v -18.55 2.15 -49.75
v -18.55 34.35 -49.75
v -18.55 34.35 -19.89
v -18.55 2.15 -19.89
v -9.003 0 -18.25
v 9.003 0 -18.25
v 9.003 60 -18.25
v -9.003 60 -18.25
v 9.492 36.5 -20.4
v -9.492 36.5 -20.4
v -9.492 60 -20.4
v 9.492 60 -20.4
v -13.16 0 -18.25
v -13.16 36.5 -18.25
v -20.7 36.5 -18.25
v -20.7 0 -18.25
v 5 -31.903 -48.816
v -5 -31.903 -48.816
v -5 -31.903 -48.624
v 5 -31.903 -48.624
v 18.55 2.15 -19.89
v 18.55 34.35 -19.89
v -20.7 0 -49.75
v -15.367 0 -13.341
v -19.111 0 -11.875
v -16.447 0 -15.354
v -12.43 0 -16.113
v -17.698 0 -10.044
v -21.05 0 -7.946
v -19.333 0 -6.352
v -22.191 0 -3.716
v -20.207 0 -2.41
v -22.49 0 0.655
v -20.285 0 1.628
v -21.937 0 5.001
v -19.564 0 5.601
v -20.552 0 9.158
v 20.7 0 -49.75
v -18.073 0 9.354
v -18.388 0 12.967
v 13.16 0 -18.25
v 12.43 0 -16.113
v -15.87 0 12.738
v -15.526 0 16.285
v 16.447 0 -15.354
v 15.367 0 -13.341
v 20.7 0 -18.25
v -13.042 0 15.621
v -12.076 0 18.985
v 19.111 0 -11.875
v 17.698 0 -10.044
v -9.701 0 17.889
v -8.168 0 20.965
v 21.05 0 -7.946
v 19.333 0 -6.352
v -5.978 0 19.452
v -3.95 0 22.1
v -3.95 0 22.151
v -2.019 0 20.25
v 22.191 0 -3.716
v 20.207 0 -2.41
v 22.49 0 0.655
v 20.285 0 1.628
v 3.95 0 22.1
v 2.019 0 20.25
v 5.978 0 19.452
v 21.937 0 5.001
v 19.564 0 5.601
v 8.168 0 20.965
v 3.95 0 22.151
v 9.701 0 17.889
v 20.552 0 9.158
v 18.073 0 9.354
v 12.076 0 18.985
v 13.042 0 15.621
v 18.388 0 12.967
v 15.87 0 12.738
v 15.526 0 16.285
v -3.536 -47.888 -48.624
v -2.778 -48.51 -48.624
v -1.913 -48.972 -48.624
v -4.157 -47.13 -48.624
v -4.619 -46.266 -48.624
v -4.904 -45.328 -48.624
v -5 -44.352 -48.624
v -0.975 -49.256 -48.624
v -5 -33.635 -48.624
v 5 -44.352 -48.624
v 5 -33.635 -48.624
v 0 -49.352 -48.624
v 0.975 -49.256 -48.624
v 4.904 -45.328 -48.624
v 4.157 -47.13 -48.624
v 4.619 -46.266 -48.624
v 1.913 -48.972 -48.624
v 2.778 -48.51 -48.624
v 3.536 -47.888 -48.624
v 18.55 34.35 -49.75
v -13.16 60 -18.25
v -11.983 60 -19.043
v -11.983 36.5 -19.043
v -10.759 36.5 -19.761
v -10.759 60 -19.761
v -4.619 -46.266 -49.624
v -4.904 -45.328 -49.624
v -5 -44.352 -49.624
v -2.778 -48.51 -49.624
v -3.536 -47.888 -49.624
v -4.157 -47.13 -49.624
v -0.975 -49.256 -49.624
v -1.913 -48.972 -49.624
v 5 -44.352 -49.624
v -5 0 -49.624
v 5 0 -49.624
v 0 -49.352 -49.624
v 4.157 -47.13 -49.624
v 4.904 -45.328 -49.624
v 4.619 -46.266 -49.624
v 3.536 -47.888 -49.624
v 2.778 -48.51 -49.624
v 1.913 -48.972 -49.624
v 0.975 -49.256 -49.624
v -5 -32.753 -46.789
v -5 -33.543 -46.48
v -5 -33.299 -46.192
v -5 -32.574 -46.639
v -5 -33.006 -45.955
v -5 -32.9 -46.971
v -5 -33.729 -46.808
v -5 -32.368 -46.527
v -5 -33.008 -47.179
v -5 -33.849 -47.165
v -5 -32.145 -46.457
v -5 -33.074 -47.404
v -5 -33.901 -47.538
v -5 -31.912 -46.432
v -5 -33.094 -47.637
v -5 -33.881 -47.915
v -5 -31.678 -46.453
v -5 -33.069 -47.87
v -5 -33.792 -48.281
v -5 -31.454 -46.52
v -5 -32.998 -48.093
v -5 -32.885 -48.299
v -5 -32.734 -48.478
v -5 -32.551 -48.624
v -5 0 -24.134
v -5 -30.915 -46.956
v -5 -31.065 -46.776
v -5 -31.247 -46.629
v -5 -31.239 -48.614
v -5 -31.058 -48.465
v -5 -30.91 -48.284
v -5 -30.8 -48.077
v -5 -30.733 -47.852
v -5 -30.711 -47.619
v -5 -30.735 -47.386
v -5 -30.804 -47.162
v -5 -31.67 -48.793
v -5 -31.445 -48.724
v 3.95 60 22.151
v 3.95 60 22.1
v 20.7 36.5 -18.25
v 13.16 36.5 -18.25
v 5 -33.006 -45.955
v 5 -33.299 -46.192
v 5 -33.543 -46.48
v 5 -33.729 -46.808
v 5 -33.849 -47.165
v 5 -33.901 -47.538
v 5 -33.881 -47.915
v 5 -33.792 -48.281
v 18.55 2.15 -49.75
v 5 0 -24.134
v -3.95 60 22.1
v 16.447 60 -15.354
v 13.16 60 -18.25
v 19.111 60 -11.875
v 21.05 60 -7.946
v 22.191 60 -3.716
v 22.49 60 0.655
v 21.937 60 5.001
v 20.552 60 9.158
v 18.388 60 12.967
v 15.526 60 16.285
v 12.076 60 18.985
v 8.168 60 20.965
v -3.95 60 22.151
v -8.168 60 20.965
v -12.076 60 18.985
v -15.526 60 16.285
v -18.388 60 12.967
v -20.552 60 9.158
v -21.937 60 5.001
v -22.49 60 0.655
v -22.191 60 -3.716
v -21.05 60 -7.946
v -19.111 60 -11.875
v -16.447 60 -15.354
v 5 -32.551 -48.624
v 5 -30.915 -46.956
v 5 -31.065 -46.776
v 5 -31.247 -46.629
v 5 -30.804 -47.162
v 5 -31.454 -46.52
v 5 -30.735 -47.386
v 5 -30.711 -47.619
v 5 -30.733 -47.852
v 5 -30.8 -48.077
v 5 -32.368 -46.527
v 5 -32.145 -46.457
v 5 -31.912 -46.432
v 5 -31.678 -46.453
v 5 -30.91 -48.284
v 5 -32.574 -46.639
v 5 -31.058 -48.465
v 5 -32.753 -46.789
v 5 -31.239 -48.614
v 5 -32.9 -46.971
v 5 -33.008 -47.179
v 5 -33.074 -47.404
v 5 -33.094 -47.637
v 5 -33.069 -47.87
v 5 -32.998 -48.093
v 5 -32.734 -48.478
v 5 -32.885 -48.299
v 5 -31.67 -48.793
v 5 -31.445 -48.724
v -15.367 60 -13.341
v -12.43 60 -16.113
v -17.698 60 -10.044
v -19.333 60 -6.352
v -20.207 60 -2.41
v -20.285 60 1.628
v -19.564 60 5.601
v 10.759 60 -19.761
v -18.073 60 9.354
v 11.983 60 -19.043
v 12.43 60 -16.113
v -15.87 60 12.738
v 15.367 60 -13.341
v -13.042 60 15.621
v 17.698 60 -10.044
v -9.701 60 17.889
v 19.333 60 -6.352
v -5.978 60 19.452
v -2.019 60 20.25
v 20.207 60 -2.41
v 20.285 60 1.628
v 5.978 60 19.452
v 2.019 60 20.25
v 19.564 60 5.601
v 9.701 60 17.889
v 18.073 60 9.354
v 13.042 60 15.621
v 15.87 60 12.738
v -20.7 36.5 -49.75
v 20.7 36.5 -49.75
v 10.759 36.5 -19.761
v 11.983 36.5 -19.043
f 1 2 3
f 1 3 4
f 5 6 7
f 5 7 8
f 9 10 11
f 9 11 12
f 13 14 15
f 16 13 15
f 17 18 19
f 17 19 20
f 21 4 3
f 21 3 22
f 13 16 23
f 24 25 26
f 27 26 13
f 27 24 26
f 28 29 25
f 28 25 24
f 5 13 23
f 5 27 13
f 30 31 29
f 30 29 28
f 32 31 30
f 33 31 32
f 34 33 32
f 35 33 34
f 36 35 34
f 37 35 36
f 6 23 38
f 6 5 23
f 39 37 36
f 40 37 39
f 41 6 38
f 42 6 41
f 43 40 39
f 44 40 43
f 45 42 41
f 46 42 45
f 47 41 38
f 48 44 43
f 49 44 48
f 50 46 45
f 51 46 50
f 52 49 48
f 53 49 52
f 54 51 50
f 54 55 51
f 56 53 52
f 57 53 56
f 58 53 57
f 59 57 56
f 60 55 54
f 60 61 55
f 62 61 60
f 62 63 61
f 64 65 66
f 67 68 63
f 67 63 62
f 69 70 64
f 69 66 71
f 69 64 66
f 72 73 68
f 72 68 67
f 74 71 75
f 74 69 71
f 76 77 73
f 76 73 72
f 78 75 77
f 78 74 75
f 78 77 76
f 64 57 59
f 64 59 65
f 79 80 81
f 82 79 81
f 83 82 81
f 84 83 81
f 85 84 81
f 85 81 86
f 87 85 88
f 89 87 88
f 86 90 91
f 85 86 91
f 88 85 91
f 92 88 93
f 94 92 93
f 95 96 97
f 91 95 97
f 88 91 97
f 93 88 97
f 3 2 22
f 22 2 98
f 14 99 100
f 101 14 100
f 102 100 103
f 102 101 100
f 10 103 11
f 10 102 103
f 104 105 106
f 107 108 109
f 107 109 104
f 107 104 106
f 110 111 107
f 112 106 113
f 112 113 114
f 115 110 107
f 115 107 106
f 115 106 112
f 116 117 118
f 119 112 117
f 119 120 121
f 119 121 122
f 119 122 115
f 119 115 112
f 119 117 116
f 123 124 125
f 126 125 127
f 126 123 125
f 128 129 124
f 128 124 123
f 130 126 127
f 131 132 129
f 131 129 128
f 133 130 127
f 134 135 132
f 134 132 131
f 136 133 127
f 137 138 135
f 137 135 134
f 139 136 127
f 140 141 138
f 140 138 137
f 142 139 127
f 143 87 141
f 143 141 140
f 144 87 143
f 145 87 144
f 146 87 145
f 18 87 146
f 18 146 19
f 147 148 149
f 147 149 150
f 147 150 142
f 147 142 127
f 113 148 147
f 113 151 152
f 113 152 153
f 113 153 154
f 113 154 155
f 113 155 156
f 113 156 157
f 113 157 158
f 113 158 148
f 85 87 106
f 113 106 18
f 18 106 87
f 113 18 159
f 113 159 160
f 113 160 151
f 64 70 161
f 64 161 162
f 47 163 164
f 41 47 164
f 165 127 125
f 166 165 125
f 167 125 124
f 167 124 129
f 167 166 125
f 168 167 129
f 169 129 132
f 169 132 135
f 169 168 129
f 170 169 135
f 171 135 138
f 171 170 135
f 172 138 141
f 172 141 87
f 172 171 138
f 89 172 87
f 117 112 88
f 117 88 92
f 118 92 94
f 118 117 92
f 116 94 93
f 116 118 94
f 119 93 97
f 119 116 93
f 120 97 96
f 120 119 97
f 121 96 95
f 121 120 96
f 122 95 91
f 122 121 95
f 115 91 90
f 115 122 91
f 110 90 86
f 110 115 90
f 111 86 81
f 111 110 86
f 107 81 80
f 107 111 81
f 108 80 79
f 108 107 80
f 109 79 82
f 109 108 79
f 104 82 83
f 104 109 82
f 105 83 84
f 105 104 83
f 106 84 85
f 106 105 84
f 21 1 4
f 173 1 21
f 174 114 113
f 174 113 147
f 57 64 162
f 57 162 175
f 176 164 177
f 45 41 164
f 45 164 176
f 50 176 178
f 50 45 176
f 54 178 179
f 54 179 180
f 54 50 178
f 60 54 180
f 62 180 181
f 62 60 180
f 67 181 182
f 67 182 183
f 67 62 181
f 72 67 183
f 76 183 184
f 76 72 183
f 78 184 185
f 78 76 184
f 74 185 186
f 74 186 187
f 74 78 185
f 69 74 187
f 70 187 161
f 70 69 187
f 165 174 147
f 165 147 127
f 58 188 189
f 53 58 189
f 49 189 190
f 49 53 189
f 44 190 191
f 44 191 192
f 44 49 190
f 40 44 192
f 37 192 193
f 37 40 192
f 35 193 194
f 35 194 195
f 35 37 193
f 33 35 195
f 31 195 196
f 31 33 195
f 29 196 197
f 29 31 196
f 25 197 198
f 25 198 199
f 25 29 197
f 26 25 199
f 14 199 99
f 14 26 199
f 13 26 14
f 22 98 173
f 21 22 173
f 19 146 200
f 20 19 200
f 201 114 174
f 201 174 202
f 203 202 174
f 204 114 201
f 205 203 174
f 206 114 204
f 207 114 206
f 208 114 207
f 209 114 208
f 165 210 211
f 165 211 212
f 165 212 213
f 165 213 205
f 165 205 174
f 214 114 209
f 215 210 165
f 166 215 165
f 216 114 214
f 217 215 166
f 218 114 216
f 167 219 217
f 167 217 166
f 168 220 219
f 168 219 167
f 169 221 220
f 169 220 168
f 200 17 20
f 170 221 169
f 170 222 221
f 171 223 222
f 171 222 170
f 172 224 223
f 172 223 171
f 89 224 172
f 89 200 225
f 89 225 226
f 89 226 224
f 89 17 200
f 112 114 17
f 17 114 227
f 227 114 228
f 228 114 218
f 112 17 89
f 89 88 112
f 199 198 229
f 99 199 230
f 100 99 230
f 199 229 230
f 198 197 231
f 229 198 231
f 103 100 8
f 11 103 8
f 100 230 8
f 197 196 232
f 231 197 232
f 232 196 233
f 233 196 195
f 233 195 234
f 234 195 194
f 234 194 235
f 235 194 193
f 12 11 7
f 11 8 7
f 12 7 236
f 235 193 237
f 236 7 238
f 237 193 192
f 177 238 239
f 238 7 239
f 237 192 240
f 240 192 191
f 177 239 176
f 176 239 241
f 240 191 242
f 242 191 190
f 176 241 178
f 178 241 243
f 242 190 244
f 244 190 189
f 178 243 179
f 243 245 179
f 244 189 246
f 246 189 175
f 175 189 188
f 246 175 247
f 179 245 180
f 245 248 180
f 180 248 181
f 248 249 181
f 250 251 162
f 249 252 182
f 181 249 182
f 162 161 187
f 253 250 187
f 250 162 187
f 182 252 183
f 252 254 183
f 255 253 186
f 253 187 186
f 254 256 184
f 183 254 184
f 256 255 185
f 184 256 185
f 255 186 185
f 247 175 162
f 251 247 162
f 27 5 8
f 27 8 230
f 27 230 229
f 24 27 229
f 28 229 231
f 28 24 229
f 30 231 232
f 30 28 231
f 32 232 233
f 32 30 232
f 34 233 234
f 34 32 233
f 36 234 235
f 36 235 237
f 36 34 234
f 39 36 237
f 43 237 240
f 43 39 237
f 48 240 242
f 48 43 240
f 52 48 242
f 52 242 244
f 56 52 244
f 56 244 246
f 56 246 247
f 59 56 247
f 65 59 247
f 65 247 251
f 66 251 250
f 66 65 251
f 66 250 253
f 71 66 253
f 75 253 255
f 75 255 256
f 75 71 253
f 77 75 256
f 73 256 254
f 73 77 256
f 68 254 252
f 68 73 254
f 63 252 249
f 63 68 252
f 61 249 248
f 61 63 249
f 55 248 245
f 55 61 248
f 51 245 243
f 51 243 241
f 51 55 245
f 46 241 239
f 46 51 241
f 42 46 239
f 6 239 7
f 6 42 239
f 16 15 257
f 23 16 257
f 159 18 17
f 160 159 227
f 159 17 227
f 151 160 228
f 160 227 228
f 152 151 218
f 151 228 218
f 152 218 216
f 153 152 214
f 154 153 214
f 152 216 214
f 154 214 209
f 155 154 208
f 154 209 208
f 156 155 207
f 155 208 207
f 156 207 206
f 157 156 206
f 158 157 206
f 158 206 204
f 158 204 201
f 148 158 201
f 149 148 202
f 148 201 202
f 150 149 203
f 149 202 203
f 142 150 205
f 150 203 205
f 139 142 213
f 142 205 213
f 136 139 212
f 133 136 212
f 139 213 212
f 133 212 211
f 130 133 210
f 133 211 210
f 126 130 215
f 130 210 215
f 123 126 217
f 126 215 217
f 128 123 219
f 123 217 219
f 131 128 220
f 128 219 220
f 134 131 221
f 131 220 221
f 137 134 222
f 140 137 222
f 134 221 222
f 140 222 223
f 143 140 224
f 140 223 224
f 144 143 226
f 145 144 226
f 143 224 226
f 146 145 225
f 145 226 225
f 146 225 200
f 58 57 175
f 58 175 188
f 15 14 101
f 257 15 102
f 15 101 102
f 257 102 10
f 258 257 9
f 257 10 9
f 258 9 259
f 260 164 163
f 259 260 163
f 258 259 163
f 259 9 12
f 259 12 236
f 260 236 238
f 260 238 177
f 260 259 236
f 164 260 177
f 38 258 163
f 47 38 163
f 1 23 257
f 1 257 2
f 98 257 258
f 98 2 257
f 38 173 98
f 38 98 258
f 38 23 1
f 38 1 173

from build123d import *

# Parameters (mm, degrees)
F2_DEPTH  = 60
F3_DEPTH  = 36.5
F4_W      = 37.1
F4_H      = 32.2
F5_DEPTH  = 29.86
F7_DEPTH  = 5
F8_R      = 1.1918695684
F9_DEPTH  = 27.501
F11_DEPTH = 1


# Not quite as in the source:
# - the program builds the solid bodies; features that only make, move or delete a surface that nothing else refers to are left out


with BuildPart() as f2:
    # F0 (on Front) → F2 (new body)
    with BuildSketch(Plane.XZ):
        with BuildLine():
            Line((-9.4915752117, -20.4), (9.4915752117, -20.4))
            ThreePointArc((9.4915752117, -20.4), (11.3767265715, -19.4118544327), (13.1600721883, -18.25))
            ThreePointArc((13.1600721883, -18.25), (21.9371840047, 5.0009956954), (3.95, 22.1505643269))
            Line((3.95, 22.1505643269), (3.95, 22.1))
            Line((3.95, 22.1), (1.55, 22.1))
            Line((1.55, 22.1), (-1.55, 22.1))
            Line((-1.55, 22.1), (-3.95, 22.1))
            Line((-3.95, 22.1), (-3.95, 22.1505643269))
            ThreePointArc((-3.95, 22.1505643269), (-21.9371840047, 5.0009956954), (-13.1600721883, -18.25))
            ThreePointArc((-13.1600721883, -18.25), (-11.3767265715, -19.4118544327), (-9.4915752117, -20.4))
        make_face()
        with BuildLine():
            ThreePointArc((-9.0033327163, -18.25), (0, 20.35), (9.0033327163, -18.25))
            Line((9.0033327163, -18.25), (-3.61e-08, -18.25))
            Line((-3.61e-08, -18.25), (-9.0033327163, -18.25))
        make_face(mode=Mode.SUBTRACT)
    extrude(amount=-F2_DEPTH)

    # F0 (on Front) → F3 (join)
    with BuildSketch(Plane.XZ):
        Polygon((18.55, -20.4), (9.4915752117, -20.4), (-9.4915752117, -20.4), (-18.55, -20.4), (-18.55, -47.6), (18.55, -47.6), align=None)
        with BuildLine():
            ThreePointArc((13.1600721883, -18.25), (11.3767265715, -19.4118544327), (9.4915752117, -20.4))
            Line((9.4915752117, -20.4), (18.55, -20.4))
            Line((18.55, -20.4), (18.55, -47.6))
            Line((18.55, -47.6), (-18.55, -47.6))
            Line((-18.55, -47.6), (-18.55, -20.4))
            Line((-18.55, -20.4), (-9.4915752117, -20.4))
            ThreePointArc((-9.4915752117, -20.4), (-11.3767265715, -19.4118544327), (-13.1600721883, -18.25))
            Line((-13.1600721883, -18.25), (-15.4320283826, -18.25))
            Line((-15.4320283826, -18.25), (-20.7, -18.25))
            Line((-20.7, -18.25), (-20.7, -49.75))
            Line((-20.7, -49.75), (20.7, -49.75))
            Line((20.7, -49.75), (20.7, -18.25))
            Line((20.7, -18.25), (15.4320283826, -18.25))
            Line((15.4320283826, -18.25), (13.1600721883, -18.25))
        make_face()
    extrude(amount=-F3_DEPTH)

    # F4 (on face) → F5 (cut)
    with BuildSketch(Plane(origin=(0, 0, -49.75), x_dir=(1, 0, 0), z_dir=(0, 0, -1))):
        with Locations((0, -18.25)):
            Rectangle(F4_W, F4_H)
    extrude(amount=-F5_DEPTH, mode=Mode.SUBTRACT)


with BuildPart() as f7:
    # F6 (on Right) → F7 (new body, symmetric)
    with BuildSketch(Plane.YZ):
        with BuildLine():
            Line((-31.902618946, -49.6237426996), (0, -49.6237426996))
            Line((0, -49.6237426996), (0, -24.1335835308))
            Line((0, -24.1335835308), (-33.0056445246, -45.9554098272))
            ThreePointArc((-33.0056445246, -45.9554098272), (-33.8179081859, -48.1996481846), (-31.902618946, -49.6237426996))
        make_face()
    extrude(amount=F7_DEPTH, both=True)

    # F8 (on face) → F9 (cut, through all)
    with BuildSketch(Plane.YZ.offset(5)):
        with Locations((-31.902618946, -47.6237426996)):
            Circle(F8_R)
    extrude(amount=-F9_DEPTH, mode=Mode.SUBTRACT)

    # F10 (on face) → F11 (join)
    with BuildSketch(Plane(origin=(0, 0, -49.6237426996), x_dir=(1, 0, 0), z_dir=(0, 0, -1))):
        with BuildLine():
            Line((-5, 44.3523228168), (-5, 31.902618946))
            Line((-5, 31.902618946), (5, 31.902618946))
            Line((5, 31.902618946), (5, 44.3523228168))
            ThreePointArc((5, 44.3523228168), (0, 49.3523228168), (-5, 44.3523228168))
        make_face()
    extrude(amount=-F11_DEPTH)


solid = Compound([f2.part, f7.part])
